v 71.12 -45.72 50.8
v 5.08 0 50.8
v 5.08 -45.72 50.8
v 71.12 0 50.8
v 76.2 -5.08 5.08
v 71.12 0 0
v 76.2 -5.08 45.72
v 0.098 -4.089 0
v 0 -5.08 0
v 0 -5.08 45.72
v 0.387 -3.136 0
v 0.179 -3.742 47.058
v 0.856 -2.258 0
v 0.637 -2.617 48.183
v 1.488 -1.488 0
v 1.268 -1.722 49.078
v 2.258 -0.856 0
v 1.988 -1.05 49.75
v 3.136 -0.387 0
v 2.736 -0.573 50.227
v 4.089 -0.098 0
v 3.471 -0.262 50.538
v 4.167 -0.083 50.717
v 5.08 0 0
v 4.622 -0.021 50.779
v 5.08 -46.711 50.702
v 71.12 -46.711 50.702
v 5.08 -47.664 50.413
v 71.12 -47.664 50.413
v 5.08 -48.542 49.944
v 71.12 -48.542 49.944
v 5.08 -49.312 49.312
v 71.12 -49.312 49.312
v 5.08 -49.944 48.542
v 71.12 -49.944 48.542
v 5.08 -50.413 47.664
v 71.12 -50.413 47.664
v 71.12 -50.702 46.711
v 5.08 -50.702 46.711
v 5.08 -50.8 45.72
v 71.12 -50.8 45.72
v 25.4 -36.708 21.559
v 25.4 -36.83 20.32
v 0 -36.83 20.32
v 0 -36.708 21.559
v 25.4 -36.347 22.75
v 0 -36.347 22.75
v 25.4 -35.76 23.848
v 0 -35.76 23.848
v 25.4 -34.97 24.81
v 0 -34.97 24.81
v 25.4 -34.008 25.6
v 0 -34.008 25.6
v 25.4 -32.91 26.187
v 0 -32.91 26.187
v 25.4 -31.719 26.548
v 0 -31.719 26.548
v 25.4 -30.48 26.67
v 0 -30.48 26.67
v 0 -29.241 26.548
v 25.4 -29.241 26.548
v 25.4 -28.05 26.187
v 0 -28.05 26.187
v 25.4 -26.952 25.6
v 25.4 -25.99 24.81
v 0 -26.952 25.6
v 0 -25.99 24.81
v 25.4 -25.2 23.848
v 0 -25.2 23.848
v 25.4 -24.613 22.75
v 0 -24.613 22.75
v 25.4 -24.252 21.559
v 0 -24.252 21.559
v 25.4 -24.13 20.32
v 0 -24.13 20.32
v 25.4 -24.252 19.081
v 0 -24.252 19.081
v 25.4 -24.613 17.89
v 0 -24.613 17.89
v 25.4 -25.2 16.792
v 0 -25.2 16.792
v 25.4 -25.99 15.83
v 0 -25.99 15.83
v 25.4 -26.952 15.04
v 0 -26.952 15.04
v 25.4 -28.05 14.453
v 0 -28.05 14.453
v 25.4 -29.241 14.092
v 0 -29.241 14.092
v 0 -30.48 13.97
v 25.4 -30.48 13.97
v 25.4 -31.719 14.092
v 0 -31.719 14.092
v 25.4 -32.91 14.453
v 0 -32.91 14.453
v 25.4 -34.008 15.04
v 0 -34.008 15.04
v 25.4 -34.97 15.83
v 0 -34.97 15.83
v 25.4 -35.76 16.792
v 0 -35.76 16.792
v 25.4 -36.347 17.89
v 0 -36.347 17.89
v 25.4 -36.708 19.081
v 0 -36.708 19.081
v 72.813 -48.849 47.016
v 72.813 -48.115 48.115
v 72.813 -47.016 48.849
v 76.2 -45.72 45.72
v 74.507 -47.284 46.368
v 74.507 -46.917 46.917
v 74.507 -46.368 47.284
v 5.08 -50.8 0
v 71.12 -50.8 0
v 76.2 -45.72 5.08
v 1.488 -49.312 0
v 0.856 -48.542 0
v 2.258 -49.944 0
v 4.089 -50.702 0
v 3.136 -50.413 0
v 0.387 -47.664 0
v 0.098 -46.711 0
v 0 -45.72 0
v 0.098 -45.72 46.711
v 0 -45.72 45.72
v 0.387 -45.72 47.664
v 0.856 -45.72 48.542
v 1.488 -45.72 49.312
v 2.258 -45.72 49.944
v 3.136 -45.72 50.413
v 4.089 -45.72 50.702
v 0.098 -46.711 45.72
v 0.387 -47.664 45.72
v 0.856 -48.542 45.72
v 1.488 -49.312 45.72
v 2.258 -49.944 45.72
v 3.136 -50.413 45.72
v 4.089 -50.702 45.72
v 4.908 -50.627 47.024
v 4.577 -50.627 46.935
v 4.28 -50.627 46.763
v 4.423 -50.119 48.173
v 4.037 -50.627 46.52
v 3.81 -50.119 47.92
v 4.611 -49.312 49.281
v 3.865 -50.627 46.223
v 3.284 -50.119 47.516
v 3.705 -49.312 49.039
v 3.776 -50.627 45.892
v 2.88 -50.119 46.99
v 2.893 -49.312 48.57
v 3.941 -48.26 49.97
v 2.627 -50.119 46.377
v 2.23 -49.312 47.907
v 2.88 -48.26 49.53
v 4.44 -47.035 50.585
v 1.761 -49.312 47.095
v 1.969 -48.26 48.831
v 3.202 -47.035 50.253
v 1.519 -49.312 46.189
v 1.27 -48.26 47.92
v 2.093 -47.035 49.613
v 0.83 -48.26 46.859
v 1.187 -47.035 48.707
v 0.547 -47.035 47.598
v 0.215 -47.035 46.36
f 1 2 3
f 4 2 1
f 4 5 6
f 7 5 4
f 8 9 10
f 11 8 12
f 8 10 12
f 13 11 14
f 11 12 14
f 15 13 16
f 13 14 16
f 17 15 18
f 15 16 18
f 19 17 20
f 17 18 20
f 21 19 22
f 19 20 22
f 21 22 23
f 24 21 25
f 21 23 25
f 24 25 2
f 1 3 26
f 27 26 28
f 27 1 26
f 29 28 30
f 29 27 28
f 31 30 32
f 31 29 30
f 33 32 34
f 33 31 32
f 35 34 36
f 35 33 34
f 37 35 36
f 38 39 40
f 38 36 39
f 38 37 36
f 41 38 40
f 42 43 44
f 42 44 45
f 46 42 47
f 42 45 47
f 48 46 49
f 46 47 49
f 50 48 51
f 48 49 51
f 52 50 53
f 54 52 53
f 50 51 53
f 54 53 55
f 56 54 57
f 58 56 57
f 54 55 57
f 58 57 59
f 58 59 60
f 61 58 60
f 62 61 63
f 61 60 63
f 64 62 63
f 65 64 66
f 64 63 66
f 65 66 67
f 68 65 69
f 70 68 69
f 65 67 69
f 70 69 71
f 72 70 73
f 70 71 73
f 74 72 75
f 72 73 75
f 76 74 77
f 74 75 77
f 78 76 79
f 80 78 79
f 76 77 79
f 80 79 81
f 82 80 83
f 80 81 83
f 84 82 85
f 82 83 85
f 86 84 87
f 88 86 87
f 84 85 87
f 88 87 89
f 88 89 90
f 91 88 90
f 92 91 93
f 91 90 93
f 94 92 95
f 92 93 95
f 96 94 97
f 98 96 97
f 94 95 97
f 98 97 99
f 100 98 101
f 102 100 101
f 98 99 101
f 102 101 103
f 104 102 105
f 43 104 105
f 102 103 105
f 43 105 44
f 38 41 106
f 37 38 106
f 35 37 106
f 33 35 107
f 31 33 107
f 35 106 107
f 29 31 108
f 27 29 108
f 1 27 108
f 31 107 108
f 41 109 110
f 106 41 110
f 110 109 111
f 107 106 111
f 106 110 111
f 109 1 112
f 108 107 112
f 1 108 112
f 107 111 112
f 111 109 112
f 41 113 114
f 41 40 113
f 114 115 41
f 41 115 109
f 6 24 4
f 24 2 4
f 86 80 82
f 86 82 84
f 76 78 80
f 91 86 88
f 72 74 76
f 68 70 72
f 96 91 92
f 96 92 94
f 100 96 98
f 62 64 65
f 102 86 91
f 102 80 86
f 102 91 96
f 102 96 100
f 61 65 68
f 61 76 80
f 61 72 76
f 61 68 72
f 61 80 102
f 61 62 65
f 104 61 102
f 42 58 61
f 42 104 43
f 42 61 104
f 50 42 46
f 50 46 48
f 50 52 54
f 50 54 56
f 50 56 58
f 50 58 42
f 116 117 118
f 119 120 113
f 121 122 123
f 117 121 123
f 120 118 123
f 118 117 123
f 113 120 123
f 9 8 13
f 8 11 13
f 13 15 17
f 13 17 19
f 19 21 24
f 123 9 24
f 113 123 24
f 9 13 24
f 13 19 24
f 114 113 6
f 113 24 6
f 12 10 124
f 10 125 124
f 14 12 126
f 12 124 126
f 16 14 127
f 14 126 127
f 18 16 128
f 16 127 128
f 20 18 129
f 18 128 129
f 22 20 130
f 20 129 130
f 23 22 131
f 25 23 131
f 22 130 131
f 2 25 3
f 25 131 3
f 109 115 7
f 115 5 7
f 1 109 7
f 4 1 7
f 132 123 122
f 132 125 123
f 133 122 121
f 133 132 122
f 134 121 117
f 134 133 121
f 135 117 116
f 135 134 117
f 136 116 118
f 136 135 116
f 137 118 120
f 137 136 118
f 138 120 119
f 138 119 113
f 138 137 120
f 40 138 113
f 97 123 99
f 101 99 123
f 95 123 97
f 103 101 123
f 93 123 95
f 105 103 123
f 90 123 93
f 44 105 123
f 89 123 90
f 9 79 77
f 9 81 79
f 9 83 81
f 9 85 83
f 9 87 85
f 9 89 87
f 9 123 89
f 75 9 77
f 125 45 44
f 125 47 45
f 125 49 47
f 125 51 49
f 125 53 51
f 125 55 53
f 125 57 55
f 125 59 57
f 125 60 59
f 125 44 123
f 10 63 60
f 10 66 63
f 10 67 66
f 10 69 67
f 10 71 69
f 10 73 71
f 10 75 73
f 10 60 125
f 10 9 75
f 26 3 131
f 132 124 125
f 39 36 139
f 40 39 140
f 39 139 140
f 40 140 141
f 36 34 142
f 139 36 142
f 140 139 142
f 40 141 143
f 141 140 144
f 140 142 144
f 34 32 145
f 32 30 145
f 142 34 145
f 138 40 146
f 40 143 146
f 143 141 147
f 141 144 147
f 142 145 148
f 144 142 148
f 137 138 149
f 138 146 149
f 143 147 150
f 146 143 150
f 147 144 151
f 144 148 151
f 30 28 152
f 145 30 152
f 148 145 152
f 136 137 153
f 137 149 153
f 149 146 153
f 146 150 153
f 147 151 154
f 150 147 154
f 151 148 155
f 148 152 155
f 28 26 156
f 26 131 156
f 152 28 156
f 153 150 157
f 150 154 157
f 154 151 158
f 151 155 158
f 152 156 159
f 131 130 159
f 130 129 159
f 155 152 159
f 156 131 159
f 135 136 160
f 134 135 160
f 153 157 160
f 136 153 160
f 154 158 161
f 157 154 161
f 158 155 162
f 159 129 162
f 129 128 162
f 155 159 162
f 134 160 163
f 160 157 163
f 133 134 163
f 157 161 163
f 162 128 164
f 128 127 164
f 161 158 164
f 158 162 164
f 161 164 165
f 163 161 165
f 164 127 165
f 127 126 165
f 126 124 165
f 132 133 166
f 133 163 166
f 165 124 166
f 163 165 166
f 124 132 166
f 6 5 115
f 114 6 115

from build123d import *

# Parameters (mm, degrees)
F0_W          = 76.2
F0_H          = 50.8
F1_DEPTH      = 50.8
F2_R          = 5.08
F3_R          = 6.35
F4_DEPTH      = 25.4
F4_DEPTH_BACK = 25.4
F5_SIZE       = 5.08


with BuildPart() as f1:
    # F0 (on Front) → F1 (new body)
    with BuildSketch(Plane.XZ):
        with Locations((38.1, 25.4)):
            Rectangle(F0_W, F0_H)
    extrude(amount=F1_DEPTH)

    # F2
    f2_edges = [f1.edges().sort_by_distance(p)[0] for p in [
        (0, -25.4, 50.8),
        (38.1, -50.8, 50.8),
        (0, -50.8, 25.4),
        (0, 0, 25.4),
    ]]
    fillet(f2_edges, radius=F2_R)

    # F3 (on face) → F4 (cut, two sides)
    with BuildSketch(Plane(origin=(0, 0, 0), x_dir=(0, -1, 0), z_dir=(-1, 0, 0))) as f4_sk:
        with Locations((30.48, 20.32)):
            Circle(F3_R)
    extrude(amount=-F4_DEPTH, mode=Mode.SUBTRACT)
    extrude(f4_sk.sketch, amount=-F4_DEPTH_BACK, mode=Mode.SUBTRACT)

    # F5
    f5_edges = [f1.edges().sort_by_distance(p)[0] for p in [
        (76.2, -50.8, 22.86),
        (76.2, -25.4, 0),
        (76.2, 0, 25.4),
    ]]
    chamfer(f5_edges, length=F5_SIZE)


solid = f1.part
